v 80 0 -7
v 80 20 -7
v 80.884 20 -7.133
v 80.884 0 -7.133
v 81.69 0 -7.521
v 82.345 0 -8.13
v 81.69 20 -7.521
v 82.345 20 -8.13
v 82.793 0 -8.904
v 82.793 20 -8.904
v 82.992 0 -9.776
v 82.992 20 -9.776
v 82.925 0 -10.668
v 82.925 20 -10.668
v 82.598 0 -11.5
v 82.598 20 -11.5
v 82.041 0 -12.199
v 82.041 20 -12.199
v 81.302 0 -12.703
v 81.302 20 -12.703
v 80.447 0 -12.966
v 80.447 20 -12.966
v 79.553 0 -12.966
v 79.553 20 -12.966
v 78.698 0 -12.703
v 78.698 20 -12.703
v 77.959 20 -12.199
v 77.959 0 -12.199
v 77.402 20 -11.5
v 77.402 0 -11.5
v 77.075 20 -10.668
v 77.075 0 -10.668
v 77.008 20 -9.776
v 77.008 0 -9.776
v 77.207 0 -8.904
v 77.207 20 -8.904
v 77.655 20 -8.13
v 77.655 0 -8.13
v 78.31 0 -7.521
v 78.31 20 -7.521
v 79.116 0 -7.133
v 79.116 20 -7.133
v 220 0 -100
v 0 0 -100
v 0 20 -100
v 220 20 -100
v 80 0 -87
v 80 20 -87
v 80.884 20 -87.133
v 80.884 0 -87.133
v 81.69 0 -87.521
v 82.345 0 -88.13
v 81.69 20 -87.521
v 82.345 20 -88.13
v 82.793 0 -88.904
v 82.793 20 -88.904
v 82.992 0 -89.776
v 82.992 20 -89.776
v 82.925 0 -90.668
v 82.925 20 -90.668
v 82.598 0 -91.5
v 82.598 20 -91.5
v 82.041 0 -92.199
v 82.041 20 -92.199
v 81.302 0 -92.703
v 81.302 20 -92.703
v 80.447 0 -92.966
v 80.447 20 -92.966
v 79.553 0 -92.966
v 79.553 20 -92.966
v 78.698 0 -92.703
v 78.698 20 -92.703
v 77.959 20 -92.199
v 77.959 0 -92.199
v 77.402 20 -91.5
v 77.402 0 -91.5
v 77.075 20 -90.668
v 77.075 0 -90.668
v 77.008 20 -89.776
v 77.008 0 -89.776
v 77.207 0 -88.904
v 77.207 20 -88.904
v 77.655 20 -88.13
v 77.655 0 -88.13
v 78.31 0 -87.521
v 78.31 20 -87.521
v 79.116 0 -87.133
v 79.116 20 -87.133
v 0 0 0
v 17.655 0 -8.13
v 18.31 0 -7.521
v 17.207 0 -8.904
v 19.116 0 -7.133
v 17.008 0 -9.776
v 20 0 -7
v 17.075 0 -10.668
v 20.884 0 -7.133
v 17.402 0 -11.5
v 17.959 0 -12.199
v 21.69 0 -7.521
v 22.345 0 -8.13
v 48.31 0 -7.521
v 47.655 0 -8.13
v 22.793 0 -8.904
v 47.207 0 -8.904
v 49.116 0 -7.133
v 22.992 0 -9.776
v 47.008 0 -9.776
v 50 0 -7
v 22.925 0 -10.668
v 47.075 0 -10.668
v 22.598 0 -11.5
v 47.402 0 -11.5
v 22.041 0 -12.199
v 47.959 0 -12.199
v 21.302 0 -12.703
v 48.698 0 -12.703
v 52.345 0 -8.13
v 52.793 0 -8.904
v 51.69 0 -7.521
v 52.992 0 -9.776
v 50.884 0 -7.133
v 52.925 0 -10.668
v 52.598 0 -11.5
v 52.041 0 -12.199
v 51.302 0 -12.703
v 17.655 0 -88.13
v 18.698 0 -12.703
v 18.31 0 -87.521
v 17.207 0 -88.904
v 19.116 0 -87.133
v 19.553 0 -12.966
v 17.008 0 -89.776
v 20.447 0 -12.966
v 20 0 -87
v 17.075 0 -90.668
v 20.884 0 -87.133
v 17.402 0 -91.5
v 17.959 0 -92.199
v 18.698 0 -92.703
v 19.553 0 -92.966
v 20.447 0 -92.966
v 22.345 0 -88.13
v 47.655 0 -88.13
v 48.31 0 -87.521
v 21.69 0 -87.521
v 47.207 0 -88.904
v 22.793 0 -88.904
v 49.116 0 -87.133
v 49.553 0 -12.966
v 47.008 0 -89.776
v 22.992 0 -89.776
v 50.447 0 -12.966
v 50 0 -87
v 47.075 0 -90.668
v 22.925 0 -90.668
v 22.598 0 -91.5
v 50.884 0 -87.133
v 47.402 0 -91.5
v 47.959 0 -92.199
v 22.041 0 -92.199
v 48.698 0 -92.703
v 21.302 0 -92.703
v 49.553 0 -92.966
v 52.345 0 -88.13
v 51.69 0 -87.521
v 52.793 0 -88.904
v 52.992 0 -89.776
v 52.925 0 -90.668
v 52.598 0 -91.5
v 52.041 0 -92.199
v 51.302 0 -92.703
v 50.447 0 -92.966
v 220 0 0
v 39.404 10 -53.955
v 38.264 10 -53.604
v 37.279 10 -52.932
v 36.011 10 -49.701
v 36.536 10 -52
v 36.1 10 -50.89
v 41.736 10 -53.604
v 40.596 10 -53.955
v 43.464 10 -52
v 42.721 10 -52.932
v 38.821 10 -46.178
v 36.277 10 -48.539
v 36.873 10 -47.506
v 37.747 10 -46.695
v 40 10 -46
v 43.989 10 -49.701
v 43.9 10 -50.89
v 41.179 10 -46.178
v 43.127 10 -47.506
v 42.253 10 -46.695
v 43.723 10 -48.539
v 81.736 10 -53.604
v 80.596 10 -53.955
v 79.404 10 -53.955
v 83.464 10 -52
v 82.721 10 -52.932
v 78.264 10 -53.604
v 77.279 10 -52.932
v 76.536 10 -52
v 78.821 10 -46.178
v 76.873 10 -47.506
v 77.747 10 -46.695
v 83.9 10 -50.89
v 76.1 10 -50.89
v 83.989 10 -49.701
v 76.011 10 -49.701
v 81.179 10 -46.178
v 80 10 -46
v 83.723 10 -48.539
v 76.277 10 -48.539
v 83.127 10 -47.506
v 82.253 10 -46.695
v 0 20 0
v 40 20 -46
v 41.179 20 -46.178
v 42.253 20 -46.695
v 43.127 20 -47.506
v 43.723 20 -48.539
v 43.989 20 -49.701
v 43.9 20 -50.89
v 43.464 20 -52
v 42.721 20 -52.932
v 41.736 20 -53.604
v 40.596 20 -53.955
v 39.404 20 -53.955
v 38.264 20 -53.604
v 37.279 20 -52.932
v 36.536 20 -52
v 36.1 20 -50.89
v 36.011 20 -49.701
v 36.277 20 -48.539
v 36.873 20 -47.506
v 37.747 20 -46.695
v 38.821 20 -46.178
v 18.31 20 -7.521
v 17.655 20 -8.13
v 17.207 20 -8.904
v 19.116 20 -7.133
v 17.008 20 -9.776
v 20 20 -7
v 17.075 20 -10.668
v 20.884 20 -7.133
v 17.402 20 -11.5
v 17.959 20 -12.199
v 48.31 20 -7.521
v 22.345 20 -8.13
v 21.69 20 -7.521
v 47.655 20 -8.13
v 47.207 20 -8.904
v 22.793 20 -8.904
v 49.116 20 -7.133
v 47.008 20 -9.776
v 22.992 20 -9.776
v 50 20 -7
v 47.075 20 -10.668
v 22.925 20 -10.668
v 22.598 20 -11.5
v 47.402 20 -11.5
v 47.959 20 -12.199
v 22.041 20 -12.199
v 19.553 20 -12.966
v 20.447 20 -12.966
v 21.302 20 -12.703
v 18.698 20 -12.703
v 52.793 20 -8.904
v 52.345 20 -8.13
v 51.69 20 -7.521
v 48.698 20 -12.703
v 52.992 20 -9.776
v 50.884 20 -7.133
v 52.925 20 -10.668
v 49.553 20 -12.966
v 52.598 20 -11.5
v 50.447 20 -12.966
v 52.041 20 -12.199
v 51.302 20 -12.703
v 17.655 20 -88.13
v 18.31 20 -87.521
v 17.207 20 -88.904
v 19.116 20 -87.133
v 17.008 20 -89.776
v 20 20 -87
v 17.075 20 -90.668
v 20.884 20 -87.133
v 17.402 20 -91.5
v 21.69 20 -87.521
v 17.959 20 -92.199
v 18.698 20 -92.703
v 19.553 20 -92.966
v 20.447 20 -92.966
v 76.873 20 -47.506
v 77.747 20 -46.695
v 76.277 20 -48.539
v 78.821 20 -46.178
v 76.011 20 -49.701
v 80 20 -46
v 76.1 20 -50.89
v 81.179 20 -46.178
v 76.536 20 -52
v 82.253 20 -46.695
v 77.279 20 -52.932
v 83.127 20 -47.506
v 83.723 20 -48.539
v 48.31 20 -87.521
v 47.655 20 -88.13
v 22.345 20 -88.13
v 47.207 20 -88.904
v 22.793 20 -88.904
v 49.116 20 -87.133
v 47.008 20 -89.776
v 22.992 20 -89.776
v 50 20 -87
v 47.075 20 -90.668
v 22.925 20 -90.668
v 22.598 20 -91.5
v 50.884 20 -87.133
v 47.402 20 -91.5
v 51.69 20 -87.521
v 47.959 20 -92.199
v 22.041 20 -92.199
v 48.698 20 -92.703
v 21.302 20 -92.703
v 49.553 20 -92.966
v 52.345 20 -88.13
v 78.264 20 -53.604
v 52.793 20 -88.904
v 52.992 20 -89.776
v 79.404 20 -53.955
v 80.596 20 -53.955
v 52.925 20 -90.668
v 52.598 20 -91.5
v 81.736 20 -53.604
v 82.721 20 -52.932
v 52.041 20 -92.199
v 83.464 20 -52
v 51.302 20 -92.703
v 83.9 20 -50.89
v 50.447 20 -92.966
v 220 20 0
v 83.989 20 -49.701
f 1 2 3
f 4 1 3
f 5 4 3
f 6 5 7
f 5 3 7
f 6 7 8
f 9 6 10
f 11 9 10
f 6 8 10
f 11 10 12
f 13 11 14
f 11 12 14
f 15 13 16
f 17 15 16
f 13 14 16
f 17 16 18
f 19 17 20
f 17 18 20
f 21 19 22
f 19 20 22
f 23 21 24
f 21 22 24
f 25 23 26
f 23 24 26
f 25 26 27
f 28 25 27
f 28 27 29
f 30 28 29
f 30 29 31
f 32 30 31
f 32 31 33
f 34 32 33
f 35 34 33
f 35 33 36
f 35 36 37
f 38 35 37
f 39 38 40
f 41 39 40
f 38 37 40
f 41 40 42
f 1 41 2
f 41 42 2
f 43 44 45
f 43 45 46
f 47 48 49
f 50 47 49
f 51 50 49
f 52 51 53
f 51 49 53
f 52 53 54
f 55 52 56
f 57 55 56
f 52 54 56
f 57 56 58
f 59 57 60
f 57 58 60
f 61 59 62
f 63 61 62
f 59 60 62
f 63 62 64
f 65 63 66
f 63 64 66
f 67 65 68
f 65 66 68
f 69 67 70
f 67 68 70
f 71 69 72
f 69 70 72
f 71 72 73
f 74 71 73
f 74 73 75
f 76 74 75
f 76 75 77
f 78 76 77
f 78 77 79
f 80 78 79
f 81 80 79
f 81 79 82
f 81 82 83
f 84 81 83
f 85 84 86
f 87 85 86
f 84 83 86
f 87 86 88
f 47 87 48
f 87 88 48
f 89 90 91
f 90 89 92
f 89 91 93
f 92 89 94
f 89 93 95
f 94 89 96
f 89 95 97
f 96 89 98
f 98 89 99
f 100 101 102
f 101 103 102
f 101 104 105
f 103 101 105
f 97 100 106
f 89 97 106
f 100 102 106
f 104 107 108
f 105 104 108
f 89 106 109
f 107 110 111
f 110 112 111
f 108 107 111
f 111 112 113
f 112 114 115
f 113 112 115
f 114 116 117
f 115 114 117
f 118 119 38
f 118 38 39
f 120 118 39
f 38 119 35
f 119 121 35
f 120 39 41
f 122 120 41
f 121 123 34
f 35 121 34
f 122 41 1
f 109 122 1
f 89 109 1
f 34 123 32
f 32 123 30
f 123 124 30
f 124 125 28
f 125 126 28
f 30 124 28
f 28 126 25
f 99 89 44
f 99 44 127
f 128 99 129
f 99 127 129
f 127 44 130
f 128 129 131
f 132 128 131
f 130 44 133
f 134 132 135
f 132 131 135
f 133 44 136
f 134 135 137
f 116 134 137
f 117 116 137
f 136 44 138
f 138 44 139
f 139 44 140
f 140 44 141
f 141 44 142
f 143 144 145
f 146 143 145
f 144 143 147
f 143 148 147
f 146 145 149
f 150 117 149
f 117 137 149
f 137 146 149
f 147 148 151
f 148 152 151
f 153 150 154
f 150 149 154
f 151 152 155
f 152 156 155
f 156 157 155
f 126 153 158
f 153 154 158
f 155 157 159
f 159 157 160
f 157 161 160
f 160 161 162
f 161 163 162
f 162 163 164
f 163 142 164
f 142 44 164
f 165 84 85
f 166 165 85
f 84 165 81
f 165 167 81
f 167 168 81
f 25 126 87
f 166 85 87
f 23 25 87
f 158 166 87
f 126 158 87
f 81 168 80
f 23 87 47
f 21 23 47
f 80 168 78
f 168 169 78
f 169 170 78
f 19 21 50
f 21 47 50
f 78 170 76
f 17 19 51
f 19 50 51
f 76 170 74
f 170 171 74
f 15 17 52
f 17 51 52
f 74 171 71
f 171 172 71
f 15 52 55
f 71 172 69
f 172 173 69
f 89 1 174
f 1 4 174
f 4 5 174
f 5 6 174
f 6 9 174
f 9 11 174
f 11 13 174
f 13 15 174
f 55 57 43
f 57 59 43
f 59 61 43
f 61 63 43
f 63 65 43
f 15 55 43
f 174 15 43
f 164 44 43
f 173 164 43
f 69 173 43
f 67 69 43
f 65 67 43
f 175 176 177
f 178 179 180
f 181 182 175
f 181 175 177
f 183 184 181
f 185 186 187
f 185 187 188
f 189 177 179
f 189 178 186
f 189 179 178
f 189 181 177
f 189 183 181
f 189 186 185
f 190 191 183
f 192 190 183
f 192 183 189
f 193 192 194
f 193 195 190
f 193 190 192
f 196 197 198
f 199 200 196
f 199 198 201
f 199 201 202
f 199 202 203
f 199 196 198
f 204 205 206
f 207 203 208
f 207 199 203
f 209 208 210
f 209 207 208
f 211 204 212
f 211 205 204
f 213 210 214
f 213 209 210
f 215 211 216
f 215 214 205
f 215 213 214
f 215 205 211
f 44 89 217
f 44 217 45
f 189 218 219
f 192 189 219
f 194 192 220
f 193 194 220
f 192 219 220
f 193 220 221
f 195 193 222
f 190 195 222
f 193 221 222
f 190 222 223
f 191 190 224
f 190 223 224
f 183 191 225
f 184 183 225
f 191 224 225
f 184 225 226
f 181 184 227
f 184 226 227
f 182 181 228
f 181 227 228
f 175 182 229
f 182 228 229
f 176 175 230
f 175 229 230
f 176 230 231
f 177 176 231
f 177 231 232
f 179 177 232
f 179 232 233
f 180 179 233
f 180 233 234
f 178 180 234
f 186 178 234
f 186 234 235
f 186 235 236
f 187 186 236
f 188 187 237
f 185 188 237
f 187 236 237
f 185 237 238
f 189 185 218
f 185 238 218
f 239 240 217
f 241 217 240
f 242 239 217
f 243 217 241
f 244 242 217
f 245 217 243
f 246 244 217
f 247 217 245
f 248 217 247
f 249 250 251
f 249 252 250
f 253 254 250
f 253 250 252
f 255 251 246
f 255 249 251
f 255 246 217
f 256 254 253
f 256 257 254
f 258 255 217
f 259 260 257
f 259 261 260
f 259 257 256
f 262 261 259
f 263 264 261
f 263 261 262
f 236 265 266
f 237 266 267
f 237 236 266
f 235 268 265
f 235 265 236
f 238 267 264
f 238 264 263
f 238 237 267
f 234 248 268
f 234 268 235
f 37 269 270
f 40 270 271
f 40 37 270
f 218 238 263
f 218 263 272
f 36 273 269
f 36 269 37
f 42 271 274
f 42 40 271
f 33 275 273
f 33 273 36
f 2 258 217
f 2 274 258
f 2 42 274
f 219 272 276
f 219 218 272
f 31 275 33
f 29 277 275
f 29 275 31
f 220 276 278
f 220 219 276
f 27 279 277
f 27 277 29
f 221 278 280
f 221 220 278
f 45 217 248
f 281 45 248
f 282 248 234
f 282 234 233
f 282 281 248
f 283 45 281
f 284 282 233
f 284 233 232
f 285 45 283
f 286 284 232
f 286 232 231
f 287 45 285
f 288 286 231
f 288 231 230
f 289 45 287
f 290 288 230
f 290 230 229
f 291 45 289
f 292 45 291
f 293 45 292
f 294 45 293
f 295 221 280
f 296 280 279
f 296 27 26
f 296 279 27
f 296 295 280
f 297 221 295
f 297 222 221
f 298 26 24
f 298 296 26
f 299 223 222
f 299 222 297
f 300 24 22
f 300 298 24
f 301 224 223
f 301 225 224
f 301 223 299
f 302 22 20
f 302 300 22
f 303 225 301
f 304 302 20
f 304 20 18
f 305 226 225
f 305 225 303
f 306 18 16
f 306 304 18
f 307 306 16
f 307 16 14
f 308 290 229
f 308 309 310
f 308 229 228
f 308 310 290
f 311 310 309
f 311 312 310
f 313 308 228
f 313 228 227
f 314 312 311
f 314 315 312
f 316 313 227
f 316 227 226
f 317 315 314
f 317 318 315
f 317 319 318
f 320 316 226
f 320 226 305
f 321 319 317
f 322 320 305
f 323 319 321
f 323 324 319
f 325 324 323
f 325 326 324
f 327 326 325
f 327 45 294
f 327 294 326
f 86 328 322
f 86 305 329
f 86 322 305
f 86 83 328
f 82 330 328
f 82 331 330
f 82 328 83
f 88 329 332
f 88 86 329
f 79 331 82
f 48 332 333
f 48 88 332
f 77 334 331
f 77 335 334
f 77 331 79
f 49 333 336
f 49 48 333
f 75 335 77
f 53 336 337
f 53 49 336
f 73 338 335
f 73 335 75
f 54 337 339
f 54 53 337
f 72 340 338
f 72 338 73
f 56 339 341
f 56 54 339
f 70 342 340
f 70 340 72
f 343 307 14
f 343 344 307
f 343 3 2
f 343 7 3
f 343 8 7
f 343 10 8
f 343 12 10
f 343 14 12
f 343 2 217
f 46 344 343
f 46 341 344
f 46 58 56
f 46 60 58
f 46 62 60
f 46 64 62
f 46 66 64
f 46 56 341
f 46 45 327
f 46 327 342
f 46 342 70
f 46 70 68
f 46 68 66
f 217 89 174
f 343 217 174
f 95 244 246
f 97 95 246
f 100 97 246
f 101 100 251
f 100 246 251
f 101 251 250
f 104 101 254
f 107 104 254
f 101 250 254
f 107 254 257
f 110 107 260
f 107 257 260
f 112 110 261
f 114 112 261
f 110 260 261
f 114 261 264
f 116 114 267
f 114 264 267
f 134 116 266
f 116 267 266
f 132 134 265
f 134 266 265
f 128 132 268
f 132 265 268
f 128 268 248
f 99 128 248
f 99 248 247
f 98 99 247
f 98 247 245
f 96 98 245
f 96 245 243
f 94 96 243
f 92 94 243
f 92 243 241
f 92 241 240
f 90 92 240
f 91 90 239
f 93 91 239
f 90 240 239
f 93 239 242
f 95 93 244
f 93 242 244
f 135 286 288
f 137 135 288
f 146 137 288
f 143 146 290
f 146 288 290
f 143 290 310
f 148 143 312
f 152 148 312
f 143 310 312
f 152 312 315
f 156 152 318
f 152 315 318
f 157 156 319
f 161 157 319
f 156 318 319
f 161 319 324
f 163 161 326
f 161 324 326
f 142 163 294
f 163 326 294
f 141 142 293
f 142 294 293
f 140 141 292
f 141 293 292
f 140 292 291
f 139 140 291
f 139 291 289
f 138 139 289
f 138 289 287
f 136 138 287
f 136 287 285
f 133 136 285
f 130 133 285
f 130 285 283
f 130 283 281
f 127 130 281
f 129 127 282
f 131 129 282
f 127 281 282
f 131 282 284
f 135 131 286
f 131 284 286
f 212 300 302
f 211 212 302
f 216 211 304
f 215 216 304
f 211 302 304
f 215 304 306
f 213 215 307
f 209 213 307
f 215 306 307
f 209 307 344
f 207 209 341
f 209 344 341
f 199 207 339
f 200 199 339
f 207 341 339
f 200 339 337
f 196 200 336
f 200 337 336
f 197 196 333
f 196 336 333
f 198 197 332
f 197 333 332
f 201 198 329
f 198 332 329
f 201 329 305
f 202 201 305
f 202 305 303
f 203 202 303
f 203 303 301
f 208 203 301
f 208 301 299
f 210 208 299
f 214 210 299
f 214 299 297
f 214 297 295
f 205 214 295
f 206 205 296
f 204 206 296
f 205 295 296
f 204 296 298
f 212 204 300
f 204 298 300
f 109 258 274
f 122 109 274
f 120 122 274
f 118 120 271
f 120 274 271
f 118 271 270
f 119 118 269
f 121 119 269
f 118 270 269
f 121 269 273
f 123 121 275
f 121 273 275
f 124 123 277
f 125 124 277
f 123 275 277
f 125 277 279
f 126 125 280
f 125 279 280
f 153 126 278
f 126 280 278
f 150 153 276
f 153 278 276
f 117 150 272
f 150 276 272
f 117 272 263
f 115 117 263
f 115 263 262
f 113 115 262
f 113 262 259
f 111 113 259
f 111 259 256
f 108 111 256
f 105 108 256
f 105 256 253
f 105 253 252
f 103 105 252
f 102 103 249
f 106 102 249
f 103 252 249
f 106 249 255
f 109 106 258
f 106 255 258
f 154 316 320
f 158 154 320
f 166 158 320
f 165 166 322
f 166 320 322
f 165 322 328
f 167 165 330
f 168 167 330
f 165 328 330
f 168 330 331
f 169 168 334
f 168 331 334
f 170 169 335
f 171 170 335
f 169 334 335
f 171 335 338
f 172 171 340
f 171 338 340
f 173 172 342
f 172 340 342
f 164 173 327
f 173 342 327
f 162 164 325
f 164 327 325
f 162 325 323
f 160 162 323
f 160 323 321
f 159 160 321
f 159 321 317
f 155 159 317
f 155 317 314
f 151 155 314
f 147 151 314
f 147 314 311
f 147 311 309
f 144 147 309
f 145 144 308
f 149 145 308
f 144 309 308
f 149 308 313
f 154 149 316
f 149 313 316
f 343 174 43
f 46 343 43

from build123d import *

# Parameters (mm, degrees)
SKETCH_1_W          = 220
SKETCH_1_H          = 100
EXTRUDE_1_DEPTH     = 20
SKETCH_2_R          = 4
CUT_EXTRUDE_1_DEPTH = 10
SKETCH_3_R          = 3
CUT_EXTRUDE_2_DEPTH = 20


with BuildPart() as part:
    # Эскиз1 → Бобышка-Вытянуть1 (new body)
    with BuildSketch(Plane(origin=(0, 0, 0), x_dir=(1, 0, 0), z_dir=(0, 1, 0))):
        with Locations((110, 50)):
            Rectangle(SKETCH_1_W, SKETCH_1_H)
    extrude(amount=EXTRUDE_1_DEPTH)

    # Эскиз2 → Вырез-Вытянуть1 (cut)
    with BuildSketch(Plane(origin=(0, 20, 0), x_dir=(1, 0, 0), z_dir=(0, 1, 0))):
        with Locations(Location((80, 50, 0), (0, 0, 270))):
            Circle(SKETCH_2_R)
        with Locations(Location((40, 50, 0), (0, 0, 270))):
            Circle(SKETCH_2_R)
    extrude(amount=-CUT_EXTRUDE_1_DEPTH, mode=Mode.SUBTRACT)

    # Эскиз3 → Вырез-Вытянуть2 (cut)
    with BuildSketch(Plane(origin=(0, 20, 0), x_dir=(1, 0, 0), z_dir=(0, 1, 0))):
        with Locations(Location((20, 90, 0), (0, 0, 270))):
            Circle(SKETCH_3_R)
        with Locations(Location((50, 90, 0), (0, 0, 270))):
            Circle(SKETCH_3_R)
        with Locations(Location((80, 90, 0), (0, 0, 270))):
            Circle(SKETCH_3_R)
        with Locations(Location((20, 10, 0), (0, 0, 270))):
            Circle(SKETCH_3_R)
        with Locations(Location((50, 10, 0), (0, 0, 270))):
            Circle(SKETCH_3_R)
        with Locations(Location((80, 10, 0), (0, 0, 270))):
            Circle(SKETCH_3_R)
    extrude(amount=-CUT_EXTRUDE_2_DEPTH, mode=Mode.SUBTRACT)


solid = part.part
